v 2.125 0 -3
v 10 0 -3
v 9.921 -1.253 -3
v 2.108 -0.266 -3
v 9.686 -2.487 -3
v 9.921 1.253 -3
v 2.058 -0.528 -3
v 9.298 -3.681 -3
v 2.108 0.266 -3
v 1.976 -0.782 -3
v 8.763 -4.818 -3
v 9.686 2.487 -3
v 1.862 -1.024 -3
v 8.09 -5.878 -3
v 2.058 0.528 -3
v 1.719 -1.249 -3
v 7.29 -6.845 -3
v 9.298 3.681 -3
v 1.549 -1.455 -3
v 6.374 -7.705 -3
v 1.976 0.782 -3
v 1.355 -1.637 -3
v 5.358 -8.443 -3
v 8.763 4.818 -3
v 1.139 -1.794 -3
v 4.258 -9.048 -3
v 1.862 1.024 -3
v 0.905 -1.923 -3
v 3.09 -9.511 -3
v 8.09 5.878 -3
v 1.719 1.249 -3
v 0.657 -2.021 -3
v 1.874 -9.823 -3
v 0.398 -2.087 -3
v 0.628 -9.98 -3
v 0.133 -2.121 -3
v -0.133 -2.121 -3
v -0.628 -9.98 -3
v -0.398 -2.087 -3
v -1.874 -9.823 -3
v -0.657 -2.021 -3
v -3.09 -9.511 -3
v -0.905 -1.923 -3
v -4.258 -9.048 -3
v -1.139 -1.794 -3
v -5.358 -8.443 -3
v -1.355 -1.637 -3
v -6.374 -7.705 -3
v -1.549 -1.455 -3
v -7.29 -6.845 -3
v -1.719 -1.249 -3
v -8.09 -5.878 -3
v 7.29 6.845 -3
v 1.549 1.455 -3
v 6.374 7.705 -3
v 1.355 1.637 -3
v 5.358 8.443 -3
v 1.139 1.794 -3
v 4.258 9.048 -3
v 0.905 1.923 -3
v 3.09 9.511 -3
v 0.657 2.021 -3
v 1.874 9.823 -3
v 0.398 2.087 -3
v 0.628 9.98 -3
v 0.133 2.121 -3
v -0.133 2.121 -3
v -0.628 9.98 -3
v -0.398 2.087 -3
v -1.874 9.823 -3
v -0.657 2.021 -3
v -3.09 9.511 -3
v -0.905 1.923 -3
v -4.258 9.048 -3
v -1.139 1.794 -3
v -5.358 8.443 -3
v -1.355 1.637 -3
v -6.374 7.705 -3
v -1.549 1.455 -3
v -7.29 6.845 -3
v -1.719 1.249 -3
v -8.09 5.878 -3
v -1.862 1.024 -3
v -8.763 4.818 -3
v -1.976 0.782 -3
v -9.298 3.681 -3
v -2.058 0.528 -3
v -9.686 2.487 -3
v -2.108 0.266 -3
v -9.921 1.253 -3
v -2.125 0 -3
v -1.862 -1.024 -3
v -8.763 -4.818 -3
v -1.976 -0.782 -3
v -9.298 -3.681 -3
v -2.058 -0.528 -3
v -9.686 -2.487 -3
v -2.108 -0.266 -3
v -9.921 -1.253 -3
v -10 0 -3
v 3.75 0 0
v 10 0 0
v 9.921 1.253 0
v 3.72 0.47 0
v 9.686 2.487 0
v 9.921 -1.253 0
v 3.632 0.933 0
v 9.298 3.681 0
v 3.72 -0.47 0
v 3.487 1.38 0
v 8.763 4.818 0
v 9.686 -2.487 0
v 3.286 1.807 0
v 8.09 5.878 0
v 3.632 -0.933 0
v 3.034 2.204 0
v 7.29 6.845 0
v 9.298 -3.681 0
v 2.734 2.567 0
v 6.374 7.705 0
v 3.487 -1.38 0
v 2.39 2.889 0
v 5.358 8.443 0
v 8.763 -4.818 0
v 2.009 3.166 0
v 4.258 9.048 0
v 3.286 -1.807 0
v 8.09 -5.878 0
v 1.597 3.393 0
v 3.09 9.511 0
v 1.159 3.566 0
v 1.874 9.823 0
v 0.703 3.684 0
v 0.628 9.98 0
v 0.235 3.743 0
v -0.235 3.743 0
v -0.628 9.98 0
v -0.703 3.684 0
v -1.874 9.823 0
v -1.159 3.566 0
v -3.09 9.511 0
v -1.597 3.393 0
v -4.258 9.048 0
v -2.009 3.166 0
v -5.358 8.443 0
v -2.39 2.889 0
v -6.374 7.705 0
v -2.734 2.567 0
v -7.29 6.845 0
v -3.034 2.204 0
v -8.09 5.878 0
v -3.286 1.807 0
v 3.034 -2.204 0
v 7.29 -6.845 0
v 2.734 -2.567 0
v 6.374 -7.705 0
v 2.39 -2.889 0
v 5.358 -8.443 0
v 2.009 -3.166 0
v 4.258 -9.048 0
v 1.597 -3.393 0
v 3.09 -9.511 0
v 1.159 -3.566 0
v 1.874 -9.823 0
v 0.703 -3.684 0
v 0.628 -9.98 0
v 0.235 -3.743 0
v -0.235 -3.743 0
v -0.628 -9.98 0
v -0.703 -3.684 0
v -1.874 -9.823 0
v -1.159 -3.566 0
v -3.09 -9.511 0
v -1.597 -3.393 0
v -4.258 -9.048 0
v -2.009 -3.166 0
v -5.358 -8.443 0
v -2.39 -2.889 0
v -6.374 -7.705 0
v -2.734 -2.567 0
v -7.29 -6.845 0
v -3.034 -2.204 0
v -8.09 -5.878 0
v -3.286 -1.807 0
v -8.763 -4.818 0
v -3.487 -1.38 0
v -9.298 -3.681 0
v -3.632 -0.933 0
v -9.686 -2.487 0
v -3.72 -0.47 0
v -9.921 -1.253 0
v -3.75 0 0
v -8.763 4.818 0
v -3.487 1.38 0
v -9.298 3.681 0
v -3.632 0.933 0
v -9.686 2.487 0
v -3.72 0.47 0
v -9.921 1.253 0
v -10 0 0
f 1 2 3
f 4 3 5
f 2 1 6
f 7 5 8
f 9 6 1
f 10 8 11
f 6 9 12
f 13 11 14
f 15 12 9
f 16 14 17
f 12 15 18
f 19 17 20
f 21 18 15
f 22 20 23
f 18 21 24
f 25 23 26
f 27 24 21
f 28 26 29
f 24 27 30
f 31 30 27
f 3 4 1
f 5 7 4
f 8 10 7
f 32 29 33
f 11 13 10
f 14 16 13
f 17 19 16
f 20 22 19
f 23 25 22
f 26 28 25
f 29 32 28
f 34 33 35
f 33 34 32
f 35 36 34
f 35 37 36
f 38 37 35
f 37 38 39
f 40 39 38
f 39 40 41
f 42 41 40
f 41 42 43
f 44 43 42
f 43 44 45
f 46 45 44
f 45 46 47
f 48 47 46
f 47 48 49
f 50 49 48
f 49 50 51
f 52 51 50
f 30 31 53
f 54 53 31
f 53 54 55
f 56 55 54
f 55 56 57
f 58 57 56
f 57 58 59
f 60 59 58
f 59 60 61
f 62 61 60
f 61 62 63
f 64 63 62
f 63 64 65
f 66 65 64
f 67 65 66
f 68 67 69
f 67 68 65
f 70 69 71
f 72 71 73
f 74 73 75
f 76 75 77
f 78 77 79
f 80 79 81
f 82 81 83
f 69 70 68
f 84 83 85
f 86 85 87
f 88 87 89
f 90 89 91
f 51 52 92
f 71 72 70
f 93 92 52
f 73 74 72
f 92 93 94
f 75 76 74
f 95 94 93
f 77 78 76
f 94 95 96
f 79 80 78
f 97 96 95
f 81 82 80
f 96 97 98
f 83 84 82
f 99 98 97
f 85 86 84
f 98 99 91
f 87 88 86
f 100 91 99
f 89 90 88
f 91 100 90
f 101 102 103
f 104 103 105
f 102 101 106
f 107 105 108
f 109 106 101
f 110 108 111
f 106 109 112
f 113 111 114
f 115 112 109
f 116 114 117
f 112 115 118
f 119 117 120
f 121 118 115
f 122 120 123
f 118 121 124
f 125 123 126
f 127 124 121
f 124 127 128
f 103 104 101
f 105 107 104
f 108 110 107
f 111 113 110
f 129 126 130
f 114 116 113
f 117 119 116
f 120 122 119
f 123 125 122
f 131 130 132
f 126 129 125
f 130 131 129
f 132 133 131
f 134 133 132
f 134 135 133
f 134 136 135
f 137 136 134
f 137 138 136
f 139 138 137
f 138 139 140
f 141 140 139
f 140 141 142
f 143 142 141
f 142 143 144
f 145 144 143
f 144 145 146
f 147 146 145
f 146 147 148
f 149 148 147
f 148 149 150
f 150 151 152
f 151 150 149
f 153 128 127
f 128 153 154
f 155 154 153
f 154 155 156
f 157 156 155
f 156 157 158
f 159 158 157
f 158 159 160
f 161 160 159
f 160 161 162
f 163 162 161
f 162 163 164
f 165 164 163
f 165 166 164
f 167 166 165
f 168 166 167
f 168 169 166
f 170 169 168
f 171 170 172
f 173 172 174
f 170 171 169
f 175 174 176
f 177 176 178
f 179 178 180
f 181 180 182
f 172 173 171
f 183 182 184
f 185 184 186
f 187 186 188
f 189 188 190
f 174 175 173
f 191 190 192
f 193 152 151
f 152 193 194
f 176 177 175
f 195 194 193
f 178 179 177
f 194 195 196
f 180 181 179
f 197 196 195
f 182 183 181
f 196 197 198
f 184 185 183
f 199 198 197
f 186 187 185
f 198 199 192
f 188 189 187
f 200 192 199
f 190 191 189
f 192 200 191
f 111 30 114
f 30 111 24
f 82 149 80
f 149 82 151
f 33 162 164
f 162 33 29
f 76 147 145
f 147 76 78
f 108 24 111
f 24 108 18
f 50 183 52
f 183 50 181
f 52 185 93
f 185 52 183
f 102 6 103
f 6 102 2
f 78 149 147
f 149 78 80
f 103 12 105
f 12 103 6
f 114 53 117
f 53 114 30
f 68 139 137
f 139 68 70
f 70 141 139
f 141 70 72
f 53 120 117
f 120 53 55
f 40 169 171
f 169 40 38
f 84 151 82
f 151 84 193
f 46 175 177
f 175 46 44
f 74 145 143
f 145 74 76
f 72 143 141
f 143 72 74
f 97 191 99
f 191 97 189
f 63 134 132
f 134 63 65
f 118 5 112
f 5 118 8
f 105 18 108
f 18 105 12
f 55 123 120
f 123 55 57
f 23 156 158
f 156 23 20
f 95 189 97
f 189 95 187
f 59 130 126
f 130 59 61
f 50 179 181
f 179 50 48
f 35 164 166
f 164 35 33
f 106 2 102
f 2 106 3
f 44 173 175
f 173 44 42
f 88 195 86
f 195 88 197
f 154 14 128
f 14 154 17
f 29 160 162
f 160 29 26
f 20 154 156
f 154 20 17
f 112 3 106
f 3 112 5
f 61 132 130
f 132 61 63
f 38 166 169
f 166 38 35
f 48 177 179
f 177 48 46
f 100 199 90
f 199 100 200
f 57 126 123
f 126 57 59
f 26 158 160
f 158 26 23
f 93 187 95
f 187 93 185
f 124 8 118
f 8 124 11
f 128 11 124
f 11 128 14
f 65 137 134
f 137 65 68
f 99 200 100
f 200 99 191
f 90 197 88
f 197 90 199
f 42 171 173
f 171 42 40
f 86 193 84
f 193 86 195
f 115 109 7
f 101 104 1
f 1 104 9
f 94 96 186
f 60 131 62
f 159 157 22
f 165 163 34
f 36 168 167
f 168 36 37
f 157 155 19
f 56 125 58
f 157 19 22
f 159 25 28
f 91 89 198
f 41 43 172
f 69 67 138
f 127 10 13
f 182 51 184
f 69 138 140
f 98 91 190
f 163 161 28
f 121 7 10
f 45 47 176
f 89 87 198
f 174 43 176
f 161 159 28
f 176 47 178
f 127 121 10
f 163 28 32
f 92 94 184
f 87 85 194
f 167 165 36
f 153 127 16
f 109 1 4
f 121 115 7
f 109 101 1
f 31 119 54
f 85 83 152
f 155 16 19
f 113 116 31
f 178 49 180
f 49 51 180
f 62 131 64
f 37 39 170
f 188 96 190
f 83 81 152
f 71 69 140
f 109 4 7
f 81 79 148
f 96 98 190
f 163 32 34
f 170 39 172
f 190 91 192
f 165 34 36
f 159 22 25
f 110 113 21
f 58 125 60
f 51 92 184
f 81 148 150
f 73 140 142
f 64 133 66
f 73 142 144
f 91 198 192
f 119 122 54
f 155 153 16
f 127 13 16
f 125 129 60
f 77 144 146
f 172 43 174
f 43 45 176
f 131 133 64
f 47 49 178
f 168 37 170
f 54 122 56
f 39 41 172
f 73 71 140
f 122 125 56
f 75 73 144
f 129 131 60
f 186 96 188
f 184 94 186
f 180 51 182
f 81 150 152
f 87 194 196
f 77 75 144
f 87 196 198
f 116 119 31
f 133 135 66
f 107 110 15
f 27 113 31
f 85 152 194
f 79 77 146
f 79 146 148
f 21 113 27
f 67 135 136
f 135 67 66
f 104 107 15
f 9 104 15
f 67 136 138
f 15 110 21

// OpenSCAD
$fn = 50;


difference() {
	union() {
		translate(v = [0, 0, -3.0000000000]) {
			cylinder(h = 3, r = 7.0000000000);
		}
		translate(v = [0, 0, -3.0000000000]) {
			cylinder(h = 3, r = 10.0000000000);
		}
	}
	union() {
		translate(v = [0, 0, 0]) {
			rotate(a = [0, 0, 0]) {
				difference() {
					union() {
						#translate(v = [0, 0, -3.0000000000]) {
							cylinder(h = 3, r = 2.0000000000);
						}
						#translate(v = [0, 0, -3]) {
							cylinder(h = 3, r = 7.0000000000, r1 = 2.1250000000, r2 = 3.7500000000);
						}
						#translate(v = [0, 0, -3.0000000000]) {
							cylinder(h = 3, r = 2.1250000000);
						}
						#translate(v = [0, 0, -3.0000000000]) {
							cylinder(h = 3, r = 2.0000000000);
						}
					}
					union();
				}
			}
		}
	}
}
